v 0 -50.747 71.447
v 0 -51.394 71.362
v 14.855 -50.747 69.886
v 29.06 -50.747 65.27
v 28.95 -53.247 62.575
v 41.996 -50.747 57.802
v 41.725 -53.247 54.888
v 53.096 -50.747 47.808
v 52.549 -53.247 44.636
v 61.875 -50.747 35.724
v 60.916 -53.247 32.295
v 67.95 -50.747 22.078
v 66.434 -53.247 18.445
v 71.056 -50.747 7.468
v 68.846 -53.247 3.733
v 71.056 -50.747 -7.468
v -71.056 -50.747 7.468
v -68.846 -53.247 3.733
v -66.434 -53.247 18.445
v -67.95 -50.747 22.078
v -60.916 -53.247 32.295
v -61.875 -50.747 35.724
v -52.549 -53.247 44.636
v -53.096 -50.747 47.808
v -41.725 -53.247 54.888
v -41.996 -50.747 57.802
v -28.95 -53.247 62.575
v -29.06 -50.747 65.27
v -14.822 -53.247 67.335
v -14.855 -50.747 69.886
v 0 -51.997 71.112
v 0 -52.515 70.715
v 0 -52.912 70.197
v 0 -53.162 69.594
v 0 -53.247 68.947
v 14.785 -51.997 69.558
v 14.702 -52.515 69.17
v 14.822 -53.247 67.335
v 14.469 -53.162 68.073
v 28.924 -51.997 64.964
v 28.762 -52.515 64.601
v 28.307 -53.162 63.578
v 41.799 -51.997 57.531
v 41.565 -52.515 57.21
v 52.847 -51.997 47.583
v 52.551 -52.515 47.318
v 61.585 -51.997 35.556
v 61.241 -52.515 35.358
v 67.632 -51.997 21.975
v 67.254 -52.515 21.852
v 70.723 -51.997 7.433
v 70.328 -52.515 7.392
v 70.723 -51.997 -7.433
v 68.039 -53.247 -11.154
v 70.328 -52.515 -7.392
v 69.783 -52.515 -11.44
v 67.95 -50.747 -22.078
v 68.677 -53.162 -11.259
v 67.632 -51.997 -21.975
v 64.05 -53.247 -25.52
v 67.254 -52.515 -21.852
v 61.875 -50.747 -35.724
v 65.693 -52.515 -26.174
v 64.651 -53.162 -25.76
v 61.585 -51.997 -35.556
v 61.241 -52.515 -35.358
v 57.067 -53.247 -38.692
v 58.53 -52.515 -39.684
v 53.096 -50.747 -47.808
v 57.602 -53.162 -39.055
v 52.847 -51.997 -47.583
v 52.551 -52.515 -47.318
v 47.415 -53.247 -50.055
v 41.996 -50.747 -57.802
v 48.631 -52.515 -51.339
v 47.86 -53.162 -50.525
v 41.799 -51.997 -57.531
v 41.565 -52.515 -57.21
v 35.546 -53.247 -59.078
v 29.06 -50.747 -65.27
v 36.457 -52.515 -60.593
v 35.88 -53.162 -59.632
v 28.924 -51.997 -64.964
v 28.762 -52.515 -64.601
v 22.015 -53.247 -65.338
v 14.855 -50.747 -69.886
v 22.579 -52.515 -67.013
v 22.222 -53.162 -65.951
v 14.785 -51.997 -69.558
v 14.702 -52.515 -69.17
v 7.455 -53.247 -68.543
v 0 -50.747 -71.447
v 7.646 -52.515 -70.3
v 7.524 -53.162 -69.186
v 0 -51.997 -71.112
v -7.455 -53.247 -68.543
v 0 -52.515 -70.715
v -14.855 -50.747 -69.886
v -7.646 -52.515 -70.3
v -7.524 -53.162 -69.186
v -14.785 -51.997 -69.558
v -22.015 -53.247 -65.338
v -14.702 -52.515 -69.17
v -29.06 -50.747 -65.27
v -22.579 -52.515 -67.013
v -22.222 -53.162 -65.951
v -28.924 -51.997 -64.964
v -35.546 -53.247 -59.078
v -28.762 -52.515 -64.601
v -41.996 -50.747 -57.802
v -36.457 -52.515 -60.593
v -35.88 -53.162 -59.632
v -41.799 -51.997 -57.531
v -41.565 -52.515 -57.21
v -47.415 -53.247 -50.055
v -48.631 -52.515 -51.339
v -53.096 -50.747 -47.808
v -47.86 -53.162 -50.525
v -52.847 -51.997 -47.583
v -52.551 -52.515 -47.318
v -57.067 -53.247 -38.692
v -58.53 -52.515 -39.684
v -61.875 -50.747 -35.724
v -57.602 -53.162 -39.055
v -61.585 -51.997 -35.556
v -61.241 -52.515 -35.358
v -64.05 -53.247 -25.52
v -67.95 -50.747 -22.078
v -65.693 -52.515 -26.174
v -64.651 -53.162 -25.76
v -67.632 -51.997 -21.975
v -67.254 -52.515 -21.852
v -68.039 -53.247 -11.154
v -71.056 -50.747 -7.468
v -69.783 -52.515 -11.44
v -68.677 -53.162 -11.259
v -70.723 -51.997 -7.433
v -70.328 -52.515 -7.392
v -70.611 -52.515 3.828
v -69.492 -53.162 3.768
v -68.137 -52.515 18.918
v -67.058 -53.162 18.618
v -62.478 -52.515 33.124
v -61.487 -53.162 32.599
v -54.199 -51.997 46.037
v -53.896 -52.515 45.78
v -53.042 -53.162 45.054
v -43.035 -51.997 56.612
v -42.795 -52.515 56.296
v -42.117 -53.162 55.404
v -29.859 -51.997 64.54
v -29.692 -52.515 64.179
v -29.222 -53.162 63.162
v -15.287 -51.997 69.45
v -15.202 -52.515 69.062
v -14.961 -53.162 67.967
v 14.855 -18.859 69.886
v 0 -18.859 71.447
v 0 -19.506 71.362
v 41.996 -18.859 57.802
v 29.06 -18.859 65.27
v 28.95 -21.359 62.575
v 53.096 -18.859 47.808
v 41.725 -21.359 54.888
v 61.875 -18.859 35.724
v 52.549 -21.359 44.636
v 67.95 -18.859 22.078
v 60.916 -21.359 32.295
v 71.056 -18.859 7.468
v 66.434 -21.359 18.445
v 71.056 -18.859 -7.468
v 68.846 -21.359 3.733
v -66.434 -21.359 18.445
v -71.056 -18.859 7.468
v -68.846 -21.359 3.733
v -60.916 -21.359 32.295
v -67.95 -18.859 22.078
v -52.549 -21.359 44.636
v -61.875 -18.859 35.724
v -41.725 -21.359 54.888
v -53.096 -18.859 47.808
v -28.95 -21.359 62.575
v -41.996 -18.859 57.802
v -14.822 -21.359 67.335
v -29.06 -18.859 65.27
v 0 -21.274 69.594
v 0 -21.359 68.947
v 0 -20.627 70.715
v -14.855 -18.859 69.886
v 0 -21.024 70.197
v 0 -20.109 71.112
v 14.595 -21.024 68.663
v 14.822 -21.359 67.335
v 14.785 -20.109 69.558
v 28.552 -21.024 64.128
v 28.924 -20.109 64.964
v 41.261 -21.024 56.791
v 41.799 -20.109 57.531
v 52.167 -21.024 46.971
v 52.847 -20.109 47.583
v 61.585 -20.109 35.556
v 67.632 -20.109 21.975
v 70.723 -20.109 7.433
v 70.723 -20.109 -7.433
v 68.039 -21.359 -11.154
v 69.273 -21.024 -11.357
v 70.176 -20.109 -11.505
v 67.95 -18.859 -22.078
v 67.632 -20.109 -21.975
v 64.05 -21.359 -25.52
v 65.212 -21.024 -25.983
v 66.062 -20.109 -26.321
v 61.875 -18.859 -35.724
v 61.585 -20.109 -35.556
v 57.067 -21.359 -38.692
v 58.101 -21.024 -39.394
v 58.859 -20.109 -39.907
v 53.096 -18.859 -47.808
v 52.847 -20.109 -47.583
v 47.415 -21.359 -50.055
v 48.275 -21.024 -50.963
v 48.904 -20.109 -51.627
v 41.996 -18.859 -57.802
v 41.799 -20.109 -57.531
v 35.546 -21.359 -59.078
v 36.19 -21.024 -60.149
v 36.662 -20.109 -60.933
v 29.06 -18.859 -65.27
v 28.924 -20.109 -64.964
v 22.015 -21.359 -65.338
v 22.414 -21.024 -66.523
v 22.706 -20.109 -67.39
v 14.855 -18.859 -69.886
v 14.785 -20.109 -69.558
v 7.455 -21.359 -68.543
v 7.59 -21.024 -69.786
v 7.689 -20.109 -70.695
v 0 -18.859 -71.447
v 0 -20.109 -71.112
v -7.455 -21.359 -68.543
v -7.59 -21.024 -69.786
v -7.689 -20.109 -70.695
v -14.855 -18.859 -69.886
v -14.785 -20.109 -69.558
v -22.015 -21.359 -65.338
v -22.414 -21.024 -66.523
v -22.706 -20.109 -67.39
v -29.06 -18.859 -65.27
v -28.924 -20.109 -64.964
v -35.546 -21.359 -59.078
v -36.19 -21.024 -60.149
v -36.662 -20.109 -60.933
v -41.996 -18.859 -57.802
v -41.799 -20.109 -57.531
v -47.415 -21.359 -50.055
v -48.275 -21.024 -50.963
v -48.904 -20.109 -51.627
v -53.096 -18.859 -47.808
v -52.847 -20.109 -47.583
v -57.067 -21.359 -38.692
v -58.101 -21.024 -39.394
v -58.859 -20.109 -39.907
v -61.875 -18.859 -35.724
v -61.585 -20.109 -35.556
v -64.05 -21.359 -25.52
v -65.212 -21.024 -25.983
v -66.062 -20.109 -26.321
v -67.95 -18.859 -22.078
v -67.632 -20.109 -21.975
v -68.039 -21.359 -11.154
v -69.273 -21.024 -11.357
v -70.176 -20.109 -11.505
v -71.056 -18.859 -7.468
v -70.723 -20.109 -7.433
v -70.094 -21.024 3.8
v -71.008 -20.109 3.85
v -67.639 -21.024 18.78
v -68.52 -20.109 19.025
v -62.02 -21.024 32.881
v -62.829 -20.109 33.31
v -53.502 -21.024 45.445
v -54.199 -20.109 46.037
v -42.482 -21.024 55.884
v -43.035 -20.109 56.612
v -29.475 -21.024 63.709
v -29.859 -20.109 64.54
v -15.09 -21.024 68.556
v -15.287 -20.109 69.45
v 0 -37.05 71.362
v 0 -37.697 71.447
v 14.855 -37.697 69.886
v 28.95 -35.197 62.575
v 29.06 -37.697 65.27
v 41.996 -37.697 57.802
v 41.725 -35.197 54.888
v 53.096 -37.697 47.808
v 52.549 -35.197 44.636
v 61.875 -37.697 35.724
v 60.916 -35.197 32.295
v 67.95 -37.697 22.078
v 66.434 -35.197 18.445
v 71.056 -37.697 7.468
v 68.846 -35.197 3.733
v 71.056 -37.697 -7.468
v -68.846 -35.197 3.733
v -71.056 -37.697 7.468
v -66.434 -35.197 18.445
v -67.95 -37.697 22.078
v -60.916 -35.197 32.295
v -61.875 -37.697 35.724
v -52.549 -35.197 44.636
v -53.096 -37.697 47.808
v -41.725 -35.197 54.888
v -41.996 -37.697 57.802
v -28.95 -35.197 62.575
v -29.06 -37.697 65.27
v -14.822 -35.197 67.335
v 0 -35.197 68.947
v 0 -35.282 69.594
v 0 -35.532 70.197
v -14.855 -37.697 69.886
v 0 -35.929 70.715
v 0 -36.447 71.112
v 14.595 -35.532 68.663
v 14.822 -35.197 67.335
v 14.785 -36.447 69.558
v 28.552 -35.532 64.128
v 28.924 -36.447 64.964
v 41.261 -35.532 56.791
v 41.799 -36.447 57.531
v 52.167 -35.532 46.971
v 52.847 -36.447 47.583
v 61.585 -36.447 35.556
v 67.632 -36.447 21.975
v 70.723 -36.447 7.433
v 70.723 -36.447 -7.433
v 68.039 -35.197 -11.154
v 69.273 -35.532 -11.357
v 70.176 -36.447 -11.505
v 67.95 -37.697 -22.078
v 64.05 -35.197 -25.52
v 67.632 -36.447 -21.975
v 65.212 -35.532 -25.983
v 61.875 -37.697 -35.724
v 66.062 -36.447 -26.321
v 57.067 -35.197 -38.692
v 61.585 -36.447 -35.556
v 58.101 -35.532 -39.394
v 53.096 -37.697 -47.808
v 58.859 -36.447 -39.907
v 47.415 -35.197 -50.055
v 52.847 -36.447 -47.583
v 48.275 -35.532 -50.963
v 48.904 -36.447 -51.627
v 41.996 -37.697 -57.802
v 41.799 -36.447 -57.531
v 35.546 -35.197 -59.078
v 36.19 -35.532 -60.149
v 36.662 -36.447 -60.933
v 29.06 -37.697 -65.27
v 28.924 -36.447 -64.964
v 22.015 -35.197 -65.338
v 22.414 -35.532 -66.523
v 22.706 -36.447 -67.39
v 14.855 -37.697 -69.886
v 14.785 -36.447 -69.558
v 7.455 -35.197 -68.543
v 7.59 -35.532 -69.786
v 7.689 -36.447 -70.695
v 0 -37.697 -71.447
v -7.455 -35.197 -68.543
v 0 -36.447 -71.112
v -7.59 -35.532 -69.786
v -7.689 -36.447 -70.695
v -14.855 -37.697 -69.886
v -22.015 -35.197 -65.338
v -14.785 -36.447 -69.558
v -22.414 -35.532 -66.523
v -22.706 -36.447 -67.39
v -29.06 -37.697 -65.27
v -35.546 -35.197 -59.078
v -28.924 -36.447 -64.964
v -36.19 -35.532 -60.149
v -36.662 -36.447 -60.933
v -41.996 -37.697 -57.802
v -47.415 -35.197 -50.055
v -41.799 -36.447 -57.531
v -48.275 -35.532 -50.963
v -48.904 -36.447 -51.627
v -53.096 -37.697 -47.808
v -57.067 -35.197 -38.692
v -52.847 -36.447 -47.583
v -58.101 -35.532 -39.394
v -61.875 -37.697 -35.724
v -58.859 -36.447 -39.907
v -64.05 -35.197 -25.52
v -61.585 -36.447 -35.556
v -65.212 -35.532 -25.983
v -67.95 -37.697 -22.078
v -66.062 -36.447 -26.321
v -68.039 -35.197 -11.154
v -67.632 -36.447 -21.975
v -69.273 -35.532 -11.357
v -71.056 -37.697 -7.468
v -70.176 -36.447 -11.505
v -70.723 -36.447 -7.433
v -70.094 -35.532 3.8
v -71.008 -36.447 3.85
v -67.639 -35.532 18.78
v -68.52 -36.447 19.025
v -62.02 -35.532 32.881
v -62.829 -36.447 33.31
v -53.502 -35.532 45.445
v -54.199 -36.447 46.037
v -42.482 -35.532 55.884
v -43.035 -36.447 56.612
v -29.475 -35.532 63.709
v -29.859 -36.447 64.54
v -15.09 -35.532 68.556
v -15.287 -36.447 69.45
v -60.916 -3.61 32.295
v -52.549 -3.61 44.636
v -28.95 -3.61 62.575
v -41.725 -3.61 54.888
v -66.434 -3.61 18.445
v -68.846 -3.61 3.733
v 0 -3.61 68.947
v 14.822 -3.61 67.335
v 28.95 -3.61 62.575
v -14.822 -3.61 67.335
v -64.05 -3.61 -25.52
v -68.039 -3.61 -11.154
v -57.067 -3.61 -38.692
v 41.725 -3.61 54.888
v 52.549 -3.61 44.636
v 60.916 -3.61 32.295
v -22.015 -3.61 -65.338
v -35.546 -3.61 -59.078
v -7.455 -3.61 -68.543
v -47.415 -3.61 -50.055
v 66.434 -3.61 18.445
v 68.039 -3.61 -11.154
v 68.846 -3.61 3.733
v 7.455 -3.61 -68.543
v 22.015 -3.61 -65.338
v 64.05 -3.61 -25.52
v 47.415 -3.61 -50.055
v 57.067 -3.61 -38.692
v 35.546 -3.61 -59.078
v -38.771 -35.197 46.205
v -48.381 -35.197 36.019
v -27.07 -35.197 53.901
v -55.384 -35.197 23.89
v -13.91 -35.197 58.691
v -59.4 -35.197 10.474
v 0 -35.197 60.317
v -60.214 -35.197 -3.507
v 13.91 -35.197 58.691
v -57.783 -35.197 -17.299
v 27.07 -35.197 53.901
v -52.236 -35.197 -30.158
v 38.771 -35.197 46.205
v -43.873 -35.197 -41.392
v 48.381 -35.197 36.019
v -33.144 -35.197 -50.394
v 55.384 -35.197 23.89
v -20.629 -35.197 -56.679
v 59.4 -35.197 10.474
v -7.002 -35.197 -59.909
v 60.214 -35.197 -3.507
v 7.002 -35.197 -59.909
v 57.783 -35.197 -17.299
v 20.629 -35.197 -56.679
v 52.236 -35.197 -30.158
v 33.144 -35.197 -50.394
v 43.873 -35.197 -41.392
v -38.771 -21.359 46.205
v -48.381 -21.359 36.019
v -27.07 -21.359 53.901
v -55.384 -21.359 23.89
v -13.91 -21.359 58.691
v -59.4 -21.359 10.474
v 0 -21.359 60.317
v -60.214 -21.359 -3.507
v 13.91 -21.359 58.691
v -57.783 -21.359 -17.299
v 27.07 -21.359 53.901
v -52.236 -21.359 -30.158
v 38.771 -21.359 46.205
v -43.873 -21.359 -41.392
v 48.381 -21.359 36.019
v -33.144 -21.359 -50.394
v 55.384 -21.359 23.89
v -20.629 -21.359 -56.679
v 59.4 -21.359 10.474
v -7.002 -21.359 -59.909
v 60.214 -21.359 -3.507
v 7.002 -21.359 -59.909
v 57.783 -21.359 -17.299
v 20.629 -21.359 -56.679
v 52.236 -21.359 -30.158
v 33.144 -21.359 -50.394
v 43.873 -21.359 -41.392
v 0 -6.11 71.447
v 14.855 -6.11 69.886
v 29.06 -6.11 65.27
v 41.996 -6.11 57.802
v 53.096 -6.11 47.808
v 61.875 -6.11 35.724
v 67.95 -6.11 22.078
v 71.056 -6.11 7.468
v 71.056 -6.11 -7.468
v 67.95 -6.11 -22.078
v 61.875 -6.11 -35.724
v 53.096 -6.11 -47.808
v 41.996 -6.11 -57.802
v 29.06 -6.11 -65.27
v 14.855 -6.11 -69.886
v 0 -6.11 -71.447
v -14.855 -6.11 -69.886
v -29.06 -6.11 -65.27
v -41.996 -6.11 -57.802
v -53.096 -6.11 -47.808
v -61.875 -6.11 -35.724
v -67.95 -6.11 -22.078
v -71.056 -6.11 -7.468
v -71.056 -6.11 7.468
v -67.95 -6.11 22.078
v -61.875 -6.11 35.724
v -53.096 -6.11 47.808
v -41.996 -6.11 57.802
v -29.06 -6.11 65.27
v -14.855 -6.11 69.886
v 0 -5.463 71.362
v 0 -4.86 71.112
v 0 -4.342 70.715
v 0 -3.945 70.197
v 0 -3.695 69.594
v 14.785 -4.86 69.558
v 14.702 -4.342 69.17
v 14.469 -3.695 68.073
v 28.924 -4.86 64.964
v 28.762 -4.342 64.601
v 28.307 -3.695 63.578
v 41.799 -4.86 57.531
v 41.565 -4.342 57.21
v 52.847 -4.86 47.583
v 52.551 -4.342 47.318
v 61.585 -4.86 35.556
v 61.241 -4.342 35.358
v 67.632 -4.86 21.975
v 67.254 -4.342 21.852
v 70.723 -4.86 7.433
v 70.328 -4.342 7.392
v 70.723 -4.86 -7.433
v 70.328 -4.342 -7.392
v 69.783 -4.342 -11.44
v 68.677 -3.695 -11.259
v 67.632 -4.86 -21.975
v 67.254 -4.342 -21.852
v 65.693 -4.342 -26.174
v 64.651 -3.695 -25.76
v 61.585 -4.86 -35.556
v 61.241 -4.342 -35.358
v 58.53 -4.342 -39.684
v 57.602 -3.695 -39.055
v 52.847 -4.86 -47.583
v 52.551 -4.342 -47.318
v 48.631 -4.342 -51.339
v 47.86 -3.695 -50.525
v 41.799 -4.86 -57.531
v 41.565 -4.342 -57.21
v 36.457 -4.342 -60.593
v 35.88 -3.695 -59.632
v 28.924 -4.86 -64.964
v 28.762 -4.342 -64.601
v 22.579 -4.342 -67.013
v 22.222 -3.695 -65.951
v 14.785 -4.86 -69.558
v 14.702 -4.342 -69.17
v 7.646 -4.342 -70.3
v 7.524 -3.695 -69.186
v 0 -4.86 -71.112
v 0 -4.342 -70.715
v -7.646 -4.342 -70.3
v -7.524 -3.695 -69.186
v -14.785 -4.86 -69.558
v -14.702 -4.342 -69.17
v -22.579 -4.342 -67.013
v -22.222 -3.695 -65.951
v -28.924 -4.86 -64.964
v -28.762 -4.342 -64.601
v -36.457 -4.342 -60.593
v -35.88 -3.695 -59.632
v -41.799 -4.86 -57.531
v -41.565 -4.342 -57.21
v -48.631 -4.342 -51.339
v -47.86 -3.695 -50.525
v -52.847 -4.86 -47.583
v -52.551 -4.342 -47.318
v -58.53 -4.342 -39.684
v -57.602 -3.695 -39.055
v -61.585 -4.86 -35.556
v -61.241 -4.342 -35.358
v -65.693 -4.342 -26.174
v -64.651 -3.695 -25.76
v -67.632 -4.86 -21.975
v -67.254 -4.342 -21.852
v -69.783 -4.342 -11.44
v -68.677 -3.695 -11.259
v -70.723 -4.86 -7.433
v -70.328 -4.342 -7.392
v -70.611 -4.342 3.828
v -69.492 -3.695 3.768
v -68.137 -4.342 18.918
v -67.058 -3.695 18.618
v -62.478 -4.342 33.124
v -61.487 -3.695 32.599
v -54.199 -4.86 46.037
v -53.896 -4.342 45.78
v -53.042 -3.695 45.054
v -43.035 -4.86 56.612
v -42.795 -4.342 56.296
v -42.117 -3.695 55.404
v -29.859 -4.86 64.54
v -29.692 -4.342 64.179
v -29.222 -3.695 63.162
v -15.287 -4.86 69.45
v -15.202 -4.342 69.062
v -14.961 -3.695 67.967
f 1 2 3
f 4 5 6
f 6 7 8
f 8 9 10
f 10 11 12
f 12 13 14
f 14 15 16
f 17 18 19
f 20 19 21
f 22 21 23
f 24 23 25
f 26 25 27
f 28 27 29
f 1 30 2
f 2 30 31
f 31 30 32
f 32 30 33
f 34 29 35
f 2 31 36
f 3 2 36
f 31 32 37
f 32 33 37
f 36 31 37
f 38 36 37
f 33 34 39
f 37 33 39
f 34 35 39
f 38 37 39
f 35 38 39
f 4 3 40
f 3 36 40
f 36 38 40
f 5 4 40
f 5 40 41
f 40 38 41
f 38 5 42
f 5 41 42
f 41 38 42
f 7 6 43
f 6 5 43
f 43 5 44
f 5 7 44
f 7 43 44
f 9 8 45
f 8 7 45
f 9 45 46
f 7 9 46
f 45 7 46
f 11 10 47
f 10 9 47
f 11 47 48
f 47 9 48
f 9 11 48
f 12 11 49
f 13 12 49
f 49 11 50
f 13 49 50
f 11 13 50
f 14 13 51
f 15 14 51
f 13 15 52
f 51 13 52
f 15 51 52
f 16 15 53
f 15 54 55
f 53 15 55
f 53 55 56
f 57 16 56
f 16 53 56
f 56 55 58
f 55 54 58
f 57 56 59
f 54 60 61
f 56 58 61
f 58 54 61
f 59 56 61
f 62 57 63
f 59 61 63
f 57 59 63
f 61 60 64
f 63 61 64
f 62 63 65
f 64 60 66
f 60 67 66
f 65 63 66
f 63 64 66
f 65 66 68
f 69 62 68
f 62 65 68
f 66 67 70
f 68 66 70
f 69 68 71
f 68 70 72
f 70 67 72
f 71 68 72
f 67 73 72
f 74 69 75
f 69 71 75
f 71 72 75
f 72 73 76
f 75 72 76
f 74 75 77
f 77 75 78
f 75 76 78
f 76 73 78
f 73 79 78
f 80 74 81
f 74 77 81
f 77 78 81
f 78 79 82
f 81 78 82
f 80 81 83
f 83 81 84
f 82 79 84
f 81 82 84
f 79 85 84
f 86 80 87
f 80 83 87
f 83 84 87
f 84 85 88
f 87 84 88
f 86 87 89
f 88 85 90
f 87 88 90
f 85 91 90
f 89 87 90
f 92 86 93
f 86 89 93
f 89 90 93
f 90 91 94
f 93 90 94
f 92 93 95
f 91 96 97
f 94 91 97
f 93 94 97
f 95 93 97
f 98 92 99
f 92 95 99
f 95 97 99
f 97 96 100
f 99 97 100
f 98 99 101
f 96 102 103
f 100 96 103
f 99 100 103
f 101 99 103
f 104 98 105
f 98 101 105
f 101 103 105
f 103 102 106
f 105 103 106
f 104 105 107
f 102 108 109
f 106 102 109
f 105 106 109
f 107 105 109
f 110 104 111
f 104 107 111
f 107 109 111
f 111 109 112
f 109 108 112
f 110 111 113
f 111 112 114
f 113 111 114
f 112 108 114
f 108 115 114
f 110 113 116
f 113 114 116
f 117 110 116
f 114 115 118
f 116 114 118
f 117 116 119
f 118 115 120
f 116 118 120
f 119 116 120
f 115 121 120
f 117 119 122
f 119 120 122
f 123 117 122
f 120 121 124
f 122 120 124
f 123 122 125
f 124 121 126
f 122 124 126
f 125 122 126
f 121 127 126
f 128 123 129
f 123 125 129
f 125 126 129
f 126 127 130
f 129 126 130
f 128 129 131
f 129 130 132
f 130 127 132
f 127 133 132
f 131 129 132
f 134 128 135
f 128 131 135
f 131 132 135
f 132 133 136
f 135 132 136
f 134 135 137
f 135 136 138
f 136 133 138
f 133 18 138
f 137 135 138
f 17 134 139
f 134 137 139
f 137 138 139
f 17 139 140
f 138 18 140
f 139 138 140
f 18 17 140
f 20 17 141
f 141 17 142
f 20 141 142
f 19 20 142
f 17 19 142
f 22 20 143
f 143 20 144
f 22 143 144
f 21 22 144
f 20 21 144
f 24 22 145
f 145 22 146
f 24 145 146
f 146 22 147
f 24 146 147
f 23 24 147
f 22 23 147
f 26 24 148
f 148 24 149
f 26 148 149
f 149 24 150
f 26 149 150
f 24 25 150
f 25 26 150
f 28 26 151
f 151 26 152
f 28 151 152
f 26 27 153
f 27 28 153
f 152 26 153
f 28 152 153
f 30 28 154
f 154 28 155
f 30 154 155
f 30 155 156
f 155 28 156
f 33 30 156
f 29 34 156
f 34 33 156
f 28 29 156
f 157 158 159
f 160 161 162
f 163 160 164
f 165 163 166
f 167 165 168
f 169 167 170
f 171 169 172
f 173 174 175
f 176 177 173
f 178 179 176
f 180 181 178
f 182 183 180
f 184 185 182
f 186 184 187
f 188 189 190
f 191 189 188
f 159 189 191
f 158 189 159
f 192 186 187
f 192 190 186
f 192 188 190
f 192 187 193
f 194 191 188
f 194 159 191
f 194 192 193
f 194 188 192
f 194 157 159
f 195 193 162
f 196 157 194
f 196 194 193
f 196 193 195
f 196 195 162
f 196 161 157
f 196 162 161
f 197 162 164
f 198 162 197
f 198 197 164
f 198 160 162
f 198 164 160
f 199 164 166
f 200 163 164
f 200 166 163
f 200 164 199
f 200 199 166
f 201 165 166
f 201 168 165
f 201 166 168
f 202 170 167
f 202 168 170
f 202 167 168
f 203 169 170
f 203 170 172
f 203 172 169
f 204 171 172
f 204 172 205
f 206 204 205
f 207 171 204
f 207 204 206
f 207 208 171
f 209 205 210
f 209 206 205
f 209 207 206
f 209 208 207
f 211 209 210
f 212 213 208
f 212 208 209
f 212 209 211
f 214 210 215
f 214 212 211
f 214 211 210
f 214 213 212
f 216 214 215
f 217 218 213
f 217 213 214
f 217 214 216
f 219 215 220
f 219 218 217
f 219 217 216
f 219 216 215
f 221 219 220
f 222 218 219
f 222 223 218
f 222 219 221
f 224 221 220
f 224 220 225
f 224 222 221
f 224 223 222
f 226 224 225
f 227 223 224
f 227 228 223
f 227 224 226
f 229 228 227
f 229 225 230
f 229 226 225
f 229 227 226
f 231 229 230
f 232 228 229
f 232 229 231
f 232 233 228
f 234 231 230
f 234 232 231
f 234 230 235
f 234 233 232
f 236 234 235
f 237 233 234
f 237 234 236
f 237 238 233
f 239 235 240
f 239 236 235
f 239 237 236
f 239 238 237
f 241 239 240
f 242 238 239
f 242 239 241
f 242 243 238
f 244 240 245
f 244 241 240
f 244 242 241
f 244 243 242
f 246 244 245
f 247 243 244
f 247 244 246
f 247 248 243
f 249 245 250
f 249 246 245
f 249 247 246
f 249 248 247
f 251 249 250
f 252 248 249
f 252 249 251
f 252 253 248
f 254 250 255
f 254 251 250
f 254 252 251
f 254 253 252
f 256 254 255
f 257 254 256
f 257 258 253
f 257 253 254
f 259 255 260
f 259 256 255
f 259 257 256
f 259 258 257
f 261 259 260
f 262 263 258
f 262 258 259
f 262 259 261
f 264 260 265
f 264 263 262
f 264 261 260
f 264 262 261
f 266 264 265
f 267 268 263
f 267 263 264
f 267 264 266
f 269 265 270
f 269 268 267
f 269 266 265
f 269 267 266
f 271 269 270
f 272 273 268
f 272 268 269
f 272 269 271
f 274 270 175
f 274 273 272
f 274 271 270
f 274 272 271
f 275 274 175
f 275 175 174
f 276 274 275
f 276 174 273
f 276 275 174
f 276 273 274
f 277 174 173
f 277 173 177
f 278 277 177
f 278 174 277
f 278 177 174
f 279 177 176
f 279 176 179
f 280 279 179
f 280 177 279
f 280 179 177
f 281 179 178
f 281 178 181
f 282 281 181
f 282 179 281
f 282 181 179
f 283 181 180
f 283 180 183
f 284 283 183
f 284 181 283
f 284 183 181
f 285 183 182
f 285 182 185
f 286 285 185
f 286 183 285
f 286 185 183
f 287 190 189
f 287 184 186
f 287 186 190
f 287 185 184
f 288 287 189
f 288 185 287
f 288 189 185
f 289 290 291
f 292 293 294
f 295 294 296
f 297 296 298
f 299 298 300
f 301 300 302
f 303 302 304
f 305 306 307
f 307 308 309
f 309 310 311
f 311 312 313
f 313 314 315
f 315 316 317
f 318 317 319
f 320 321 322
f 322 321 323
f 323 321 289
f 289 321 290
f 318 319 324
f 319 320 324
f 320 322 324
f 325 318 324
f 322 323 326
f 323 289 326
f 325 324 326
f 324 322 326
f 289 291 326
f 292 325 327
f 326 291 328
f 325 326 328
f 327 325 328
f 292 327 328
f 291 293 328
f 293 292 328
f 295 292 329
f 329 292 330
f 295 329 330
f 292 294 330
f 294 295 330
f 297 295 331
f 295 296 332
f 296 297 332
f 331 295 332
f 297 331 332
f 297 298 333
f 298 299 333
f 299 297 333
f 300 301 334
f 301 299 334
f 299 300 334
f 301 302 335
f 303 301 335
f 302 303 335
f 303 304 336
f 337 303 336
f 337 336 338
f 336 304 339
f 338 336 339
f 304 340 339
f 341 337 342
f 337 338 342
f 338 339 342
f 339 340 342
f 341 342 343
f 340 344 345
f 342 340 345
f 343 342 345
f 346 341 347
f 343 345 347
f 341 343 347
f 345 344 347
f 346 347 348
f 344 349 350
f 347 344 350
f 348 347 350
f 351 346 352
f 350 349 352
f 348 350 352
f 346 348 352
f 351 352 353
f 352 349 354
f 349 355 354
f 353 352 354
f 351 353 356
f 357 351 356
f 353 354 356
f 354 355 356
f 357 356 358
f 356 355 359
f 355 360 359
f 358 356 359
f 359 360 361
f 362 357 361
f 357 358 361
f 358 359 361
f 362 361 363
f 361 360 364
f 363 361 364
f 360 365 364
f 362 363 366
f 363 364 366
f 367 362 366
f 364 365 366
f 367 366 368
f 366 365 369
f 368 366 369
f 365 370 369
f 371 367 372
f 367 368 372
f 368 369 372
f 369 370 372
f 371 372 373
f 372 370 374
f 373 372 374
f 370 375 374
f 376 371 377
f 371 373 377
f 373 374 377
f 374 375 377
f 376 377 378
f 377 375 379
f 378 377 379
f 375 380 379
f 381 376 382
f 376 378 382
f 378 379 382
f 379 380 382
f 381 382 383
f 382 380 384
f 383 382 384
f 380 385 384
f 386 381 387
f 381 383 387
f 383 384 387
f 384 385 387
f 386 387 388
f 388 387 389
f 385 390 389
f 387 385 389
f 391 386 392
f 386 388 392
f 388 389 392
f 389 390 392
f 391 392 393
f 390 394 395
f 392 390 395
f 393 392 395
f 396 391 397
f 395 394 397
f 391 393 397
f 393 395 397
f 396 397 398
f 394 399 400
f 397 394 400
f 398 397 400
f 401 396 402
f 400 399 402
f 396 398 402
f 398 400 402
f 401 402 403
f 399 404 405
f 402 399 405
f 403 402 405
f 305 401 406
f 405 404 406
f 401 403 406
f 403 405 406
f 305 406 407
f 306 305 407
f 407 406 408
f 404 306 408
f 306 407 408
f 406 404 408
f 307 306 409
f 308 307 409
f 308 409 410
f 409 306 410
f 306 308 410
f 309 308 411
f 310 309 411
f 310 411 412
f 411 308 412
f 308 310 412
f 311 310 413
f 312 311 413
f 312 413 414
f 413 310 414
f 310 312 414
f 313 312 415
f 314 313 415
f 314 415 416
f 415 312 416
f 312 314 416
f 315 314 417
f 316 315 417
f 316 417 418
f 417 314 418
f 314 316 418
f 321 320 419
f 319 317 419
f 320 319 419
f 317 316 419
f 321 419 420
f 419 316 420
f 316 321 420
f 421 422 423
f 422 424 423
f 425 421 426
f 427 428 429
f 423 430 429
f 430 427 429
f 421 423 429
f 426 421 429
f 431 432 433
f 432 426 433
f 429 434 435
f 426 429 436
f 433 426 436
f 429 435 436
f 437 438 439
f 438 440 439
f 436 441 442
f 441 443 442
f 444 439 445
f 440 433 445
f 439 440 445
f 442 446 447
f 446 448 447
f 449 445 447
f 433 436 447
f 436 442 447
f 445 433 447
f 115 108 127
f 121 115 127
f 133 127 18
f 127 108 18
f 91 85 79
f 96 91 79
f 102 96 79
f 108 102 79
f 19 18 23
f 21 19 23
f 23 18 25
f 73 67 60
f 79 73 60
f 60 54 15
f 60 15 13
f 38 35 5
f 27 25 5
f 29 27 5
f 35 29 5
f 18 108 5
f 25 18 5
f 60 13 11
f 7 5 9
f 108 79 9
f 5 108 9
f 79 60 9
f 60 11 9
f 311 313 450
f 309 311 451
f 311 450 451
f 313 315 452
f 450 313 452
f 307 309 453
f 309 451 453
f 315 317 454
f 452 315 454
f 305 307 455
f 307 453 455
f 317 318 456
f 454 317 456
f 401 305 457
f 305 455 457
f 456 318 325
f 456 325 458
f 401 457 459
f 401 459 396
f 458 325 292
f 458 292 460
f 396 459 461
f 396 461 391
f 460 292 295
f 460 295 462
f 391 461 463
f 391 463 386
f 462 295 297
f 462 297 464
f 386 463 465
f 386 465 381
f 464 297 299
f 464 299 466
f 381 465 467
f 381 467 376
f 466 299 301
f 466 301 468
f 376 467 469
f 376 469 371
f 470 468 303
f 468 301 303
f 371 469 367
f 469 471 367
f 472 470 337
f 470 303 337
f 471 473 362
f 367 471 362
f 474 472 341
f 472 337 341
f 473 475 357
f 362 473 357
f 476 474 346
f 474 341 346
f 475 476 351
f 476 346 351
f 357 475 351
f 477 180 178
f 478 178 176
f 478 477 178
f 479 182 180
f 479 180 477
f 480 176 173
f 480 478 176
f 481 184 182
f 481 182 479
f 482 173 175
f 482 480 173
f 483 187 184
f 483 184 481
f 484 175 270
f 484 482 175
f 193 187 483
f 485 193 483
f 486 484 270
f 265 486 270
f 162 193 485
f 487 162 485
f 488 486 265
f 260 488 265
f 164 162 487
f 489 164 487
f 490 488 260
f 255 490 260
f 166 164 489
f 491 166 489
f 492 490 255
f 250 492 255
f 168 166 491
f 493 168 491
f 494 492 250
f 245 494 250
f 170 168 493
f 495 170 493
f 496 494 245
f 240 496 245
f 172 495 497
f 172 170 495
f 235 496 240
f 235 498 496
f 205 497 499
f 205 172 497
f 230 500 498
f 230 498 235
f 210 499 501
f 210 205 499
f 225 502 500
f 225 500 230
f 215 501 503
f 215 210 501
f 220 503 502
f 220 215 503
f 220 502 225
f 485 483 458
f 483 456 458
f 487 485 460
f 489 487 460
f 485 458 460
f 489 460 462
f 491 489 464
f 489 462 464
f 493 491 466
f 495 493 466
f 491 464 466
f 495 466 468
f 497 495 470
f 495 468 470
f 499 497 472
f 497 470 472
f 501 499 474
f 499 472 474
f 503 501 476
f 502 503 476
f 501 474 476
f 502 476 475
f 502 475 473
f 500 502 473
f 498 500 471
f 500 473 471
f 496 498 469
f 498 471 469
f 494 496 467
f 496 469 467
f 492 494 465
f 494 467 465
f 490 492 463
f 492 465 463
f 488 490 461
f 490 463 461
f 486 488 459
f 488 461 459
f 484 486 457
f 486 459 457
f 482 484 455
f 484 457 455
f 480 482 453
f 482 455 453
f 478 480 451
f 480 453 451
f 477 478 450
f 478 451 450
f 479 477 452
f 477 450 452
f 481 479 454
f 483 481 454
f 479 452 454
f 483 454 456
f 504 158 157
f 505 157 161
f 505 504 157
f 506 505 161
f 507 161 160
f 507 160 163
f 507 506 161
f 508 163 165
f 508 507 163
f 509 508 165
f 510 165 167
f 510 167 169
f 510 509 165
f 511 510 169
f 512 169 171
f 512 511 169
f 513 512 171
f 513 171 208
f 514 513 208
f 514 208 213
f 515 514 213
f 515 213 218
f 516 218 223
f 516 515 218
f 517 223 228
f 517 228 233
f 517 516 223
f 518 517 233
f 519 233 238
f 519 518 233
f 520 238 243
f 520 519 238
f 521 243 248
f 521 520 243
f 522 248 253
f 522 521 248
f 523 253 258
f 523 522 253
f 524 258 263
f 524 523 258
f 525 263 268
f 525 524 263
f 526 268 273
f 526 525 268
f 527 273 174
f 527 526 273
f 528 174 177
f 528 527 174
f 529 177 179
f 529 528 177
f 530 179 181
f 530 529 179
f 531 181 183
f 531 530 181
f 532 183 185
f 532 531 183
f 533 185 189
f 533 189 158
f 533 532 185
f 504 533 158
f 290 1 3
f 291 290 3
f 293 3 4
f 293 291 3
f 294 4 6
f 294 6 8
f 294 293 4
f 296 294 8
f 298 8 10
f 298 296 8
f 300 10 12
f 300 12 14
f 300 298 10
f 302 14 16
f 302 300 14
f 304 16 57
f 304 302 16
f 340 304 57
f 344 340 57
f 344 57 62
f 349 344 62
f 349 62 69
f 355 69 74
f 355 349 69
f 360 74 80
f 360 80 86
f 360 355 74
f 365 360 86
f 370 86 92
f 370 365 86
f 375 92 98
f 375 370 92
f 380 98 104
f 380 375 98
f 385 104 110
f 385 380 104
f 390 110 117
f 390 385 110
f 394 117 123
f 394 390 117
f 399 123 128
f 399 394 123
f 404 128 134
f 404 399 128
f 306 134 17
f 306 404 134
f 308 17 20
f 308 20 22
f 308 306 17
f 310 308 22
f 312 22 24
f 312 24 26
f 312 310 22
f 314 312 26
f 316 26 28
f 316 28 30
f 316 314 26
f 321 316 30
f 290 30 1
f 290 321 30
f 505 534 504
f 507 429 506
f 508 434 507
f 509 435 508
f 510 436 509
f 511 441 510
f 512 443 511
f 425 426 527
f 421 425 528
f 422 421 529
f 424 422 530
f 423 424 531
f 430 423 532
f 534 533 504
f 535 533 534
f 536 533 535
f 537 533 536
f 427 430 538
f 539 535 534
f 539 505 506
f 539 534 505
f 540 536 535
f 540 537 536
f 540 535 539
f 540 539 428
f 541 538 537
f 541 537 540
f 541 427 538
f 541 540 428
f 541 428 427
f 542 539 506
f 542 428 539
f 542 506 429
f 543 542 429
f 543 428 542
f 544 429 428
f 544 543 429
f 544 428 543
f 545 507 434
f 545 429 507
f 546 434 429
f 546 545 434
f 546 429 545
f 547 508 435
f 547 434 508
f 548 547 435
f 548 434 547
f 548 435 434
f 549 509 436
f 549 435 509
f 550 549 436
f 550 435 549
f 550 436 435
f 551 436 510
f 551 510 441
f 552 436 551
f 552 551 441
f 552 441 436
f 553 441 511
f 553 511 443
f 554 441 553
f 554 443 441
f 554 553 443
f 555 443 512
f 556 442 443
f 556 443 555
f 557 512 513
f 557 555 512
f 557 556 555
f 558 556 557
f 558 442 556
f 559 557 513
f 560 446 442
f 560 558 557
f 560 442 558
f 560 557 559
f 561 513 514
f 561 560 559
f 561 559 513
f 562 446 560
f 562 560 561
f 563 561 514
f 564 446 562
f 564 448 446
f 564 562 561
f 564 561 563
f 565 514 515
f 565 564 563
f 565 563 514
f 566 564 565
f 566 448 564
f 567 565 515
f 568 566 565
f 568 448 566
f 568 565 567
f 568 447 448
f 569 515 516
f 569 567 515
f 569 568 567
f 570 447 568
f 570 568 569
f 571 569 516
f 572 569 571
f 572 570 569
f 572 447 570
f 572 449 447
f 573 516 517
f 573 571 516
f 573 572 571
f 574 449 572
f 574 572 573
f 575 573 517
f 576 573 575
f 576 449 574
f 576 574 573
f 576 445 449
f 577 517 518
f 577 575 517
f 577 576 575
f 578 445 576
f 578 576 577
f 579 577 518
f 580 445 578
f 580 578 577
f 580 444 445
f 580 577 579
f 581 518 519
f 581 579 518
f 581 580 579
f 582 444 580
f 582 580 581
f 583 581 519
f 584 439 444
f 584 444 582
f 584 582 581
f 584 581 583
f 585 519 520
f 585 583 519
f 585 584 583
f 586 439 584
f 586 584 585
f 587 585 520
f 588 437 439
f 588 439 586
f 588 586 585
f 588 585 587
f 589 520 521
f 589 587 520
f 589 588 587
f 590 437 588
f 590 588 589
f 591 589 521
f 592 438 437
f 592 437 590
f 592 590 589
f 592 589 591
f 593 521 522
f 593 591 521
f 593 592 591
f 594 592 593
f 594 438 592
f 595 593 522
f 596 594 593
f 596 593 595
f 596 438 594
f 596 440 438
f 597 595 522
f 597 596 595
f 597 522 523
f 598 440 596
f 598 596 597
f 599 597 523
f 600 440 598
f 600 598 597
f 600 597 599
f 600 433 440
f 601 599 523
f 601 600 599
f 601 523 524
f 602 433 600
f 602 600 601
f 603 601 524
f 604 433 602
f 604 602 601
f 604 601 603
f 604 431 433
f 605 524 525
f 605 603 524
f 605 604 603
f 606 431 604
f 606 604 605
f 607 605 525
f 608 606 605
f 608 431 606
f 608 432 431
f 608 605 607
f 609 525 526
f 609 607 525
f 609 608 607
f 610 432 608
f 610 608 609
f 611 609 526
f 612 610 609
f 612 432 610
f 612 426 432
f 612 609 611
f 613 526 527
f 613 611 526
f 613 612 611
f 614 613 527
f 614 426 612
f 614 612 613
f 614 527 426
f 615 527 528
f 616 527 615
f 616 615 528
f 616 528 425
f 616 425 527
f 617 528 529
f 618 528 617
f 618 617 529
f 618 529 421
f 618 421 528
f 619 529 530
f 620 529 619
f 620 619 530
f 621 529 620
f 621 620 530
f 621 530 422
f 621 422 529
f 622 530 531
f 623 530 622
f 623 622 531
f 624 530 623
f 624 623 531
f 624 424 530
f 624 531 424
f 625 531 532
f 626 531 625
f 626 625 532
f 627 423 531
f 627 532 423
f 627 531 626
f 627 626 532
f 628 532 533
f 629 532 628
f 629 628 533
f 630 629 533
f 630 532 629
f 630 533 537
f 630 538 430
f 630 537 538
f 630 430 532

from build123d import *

# Parameters (mm, degrees)
F0_W   = 18.0498287082
F0_H   = 60.3165104985
F0_W_2 = 13.8382017612
F0_W_3 = 17.7489968482
F0_H_2 = 11.1307352781
F2_R   = 2.5
F3_R   = 2.5
F4_R   = 2.5
F5_R   = 2.5


with BuildPart() as f1:
    # F0 (on Right) → F1 (revolve)
    with BuildSketch(Plane.YZ):
        with Locations((-44.2220792174, 30.1582552493)):
            Rectangle(F0_W, F0_H)
        with Locations((-28.2780639827, 30.1582552493)):
            Rectangle(F0_W_2, F0_H)
        with Locations((-12.484464678, 30.1582552493)):
            Rectangle(F0_W_3, F0_H)
        with Locations((-12.484464678, 65.8818781376)):
            Rectangle(F0_W_3, F0_H_2)
        with Locations((-44.2220792174, 65.8818781376)):
            Rectangle(F0_W, F0_H_2)
    revolve(axis=Axis((0, -28.4284799127, 0), (0, 1, 0)))

    # F2
    f2_edges = [f1.edges().sort_by_distance(p)[0] for p in [
        (0, -35.197165, -71.447246),
    ]]
    fillet(f2_edges, radius=F2_R)

    # F3
    f3_edges = [f1.edges().sort_by_distance(p)[0] for p in [
        (0, -21.358963, -71.447246),
    ]]
    fillet(f3_edges, radius=F3_R)

    # F4
    f4_edges = [f1.edges().sort_by_distance(p)[0] for p in [
        (0, -53.246994, -71.447246),
    ]]
    fillet(f4_edges, radius=F4_R)

    # F5
    f5_edges = [f1.edges().sort_by_distance(p)[0] for p in [
        (0, -3.609966, -71.447246),
    ]]
    fillet(f5_edges, radius=F5_R)


solid = f1.part
